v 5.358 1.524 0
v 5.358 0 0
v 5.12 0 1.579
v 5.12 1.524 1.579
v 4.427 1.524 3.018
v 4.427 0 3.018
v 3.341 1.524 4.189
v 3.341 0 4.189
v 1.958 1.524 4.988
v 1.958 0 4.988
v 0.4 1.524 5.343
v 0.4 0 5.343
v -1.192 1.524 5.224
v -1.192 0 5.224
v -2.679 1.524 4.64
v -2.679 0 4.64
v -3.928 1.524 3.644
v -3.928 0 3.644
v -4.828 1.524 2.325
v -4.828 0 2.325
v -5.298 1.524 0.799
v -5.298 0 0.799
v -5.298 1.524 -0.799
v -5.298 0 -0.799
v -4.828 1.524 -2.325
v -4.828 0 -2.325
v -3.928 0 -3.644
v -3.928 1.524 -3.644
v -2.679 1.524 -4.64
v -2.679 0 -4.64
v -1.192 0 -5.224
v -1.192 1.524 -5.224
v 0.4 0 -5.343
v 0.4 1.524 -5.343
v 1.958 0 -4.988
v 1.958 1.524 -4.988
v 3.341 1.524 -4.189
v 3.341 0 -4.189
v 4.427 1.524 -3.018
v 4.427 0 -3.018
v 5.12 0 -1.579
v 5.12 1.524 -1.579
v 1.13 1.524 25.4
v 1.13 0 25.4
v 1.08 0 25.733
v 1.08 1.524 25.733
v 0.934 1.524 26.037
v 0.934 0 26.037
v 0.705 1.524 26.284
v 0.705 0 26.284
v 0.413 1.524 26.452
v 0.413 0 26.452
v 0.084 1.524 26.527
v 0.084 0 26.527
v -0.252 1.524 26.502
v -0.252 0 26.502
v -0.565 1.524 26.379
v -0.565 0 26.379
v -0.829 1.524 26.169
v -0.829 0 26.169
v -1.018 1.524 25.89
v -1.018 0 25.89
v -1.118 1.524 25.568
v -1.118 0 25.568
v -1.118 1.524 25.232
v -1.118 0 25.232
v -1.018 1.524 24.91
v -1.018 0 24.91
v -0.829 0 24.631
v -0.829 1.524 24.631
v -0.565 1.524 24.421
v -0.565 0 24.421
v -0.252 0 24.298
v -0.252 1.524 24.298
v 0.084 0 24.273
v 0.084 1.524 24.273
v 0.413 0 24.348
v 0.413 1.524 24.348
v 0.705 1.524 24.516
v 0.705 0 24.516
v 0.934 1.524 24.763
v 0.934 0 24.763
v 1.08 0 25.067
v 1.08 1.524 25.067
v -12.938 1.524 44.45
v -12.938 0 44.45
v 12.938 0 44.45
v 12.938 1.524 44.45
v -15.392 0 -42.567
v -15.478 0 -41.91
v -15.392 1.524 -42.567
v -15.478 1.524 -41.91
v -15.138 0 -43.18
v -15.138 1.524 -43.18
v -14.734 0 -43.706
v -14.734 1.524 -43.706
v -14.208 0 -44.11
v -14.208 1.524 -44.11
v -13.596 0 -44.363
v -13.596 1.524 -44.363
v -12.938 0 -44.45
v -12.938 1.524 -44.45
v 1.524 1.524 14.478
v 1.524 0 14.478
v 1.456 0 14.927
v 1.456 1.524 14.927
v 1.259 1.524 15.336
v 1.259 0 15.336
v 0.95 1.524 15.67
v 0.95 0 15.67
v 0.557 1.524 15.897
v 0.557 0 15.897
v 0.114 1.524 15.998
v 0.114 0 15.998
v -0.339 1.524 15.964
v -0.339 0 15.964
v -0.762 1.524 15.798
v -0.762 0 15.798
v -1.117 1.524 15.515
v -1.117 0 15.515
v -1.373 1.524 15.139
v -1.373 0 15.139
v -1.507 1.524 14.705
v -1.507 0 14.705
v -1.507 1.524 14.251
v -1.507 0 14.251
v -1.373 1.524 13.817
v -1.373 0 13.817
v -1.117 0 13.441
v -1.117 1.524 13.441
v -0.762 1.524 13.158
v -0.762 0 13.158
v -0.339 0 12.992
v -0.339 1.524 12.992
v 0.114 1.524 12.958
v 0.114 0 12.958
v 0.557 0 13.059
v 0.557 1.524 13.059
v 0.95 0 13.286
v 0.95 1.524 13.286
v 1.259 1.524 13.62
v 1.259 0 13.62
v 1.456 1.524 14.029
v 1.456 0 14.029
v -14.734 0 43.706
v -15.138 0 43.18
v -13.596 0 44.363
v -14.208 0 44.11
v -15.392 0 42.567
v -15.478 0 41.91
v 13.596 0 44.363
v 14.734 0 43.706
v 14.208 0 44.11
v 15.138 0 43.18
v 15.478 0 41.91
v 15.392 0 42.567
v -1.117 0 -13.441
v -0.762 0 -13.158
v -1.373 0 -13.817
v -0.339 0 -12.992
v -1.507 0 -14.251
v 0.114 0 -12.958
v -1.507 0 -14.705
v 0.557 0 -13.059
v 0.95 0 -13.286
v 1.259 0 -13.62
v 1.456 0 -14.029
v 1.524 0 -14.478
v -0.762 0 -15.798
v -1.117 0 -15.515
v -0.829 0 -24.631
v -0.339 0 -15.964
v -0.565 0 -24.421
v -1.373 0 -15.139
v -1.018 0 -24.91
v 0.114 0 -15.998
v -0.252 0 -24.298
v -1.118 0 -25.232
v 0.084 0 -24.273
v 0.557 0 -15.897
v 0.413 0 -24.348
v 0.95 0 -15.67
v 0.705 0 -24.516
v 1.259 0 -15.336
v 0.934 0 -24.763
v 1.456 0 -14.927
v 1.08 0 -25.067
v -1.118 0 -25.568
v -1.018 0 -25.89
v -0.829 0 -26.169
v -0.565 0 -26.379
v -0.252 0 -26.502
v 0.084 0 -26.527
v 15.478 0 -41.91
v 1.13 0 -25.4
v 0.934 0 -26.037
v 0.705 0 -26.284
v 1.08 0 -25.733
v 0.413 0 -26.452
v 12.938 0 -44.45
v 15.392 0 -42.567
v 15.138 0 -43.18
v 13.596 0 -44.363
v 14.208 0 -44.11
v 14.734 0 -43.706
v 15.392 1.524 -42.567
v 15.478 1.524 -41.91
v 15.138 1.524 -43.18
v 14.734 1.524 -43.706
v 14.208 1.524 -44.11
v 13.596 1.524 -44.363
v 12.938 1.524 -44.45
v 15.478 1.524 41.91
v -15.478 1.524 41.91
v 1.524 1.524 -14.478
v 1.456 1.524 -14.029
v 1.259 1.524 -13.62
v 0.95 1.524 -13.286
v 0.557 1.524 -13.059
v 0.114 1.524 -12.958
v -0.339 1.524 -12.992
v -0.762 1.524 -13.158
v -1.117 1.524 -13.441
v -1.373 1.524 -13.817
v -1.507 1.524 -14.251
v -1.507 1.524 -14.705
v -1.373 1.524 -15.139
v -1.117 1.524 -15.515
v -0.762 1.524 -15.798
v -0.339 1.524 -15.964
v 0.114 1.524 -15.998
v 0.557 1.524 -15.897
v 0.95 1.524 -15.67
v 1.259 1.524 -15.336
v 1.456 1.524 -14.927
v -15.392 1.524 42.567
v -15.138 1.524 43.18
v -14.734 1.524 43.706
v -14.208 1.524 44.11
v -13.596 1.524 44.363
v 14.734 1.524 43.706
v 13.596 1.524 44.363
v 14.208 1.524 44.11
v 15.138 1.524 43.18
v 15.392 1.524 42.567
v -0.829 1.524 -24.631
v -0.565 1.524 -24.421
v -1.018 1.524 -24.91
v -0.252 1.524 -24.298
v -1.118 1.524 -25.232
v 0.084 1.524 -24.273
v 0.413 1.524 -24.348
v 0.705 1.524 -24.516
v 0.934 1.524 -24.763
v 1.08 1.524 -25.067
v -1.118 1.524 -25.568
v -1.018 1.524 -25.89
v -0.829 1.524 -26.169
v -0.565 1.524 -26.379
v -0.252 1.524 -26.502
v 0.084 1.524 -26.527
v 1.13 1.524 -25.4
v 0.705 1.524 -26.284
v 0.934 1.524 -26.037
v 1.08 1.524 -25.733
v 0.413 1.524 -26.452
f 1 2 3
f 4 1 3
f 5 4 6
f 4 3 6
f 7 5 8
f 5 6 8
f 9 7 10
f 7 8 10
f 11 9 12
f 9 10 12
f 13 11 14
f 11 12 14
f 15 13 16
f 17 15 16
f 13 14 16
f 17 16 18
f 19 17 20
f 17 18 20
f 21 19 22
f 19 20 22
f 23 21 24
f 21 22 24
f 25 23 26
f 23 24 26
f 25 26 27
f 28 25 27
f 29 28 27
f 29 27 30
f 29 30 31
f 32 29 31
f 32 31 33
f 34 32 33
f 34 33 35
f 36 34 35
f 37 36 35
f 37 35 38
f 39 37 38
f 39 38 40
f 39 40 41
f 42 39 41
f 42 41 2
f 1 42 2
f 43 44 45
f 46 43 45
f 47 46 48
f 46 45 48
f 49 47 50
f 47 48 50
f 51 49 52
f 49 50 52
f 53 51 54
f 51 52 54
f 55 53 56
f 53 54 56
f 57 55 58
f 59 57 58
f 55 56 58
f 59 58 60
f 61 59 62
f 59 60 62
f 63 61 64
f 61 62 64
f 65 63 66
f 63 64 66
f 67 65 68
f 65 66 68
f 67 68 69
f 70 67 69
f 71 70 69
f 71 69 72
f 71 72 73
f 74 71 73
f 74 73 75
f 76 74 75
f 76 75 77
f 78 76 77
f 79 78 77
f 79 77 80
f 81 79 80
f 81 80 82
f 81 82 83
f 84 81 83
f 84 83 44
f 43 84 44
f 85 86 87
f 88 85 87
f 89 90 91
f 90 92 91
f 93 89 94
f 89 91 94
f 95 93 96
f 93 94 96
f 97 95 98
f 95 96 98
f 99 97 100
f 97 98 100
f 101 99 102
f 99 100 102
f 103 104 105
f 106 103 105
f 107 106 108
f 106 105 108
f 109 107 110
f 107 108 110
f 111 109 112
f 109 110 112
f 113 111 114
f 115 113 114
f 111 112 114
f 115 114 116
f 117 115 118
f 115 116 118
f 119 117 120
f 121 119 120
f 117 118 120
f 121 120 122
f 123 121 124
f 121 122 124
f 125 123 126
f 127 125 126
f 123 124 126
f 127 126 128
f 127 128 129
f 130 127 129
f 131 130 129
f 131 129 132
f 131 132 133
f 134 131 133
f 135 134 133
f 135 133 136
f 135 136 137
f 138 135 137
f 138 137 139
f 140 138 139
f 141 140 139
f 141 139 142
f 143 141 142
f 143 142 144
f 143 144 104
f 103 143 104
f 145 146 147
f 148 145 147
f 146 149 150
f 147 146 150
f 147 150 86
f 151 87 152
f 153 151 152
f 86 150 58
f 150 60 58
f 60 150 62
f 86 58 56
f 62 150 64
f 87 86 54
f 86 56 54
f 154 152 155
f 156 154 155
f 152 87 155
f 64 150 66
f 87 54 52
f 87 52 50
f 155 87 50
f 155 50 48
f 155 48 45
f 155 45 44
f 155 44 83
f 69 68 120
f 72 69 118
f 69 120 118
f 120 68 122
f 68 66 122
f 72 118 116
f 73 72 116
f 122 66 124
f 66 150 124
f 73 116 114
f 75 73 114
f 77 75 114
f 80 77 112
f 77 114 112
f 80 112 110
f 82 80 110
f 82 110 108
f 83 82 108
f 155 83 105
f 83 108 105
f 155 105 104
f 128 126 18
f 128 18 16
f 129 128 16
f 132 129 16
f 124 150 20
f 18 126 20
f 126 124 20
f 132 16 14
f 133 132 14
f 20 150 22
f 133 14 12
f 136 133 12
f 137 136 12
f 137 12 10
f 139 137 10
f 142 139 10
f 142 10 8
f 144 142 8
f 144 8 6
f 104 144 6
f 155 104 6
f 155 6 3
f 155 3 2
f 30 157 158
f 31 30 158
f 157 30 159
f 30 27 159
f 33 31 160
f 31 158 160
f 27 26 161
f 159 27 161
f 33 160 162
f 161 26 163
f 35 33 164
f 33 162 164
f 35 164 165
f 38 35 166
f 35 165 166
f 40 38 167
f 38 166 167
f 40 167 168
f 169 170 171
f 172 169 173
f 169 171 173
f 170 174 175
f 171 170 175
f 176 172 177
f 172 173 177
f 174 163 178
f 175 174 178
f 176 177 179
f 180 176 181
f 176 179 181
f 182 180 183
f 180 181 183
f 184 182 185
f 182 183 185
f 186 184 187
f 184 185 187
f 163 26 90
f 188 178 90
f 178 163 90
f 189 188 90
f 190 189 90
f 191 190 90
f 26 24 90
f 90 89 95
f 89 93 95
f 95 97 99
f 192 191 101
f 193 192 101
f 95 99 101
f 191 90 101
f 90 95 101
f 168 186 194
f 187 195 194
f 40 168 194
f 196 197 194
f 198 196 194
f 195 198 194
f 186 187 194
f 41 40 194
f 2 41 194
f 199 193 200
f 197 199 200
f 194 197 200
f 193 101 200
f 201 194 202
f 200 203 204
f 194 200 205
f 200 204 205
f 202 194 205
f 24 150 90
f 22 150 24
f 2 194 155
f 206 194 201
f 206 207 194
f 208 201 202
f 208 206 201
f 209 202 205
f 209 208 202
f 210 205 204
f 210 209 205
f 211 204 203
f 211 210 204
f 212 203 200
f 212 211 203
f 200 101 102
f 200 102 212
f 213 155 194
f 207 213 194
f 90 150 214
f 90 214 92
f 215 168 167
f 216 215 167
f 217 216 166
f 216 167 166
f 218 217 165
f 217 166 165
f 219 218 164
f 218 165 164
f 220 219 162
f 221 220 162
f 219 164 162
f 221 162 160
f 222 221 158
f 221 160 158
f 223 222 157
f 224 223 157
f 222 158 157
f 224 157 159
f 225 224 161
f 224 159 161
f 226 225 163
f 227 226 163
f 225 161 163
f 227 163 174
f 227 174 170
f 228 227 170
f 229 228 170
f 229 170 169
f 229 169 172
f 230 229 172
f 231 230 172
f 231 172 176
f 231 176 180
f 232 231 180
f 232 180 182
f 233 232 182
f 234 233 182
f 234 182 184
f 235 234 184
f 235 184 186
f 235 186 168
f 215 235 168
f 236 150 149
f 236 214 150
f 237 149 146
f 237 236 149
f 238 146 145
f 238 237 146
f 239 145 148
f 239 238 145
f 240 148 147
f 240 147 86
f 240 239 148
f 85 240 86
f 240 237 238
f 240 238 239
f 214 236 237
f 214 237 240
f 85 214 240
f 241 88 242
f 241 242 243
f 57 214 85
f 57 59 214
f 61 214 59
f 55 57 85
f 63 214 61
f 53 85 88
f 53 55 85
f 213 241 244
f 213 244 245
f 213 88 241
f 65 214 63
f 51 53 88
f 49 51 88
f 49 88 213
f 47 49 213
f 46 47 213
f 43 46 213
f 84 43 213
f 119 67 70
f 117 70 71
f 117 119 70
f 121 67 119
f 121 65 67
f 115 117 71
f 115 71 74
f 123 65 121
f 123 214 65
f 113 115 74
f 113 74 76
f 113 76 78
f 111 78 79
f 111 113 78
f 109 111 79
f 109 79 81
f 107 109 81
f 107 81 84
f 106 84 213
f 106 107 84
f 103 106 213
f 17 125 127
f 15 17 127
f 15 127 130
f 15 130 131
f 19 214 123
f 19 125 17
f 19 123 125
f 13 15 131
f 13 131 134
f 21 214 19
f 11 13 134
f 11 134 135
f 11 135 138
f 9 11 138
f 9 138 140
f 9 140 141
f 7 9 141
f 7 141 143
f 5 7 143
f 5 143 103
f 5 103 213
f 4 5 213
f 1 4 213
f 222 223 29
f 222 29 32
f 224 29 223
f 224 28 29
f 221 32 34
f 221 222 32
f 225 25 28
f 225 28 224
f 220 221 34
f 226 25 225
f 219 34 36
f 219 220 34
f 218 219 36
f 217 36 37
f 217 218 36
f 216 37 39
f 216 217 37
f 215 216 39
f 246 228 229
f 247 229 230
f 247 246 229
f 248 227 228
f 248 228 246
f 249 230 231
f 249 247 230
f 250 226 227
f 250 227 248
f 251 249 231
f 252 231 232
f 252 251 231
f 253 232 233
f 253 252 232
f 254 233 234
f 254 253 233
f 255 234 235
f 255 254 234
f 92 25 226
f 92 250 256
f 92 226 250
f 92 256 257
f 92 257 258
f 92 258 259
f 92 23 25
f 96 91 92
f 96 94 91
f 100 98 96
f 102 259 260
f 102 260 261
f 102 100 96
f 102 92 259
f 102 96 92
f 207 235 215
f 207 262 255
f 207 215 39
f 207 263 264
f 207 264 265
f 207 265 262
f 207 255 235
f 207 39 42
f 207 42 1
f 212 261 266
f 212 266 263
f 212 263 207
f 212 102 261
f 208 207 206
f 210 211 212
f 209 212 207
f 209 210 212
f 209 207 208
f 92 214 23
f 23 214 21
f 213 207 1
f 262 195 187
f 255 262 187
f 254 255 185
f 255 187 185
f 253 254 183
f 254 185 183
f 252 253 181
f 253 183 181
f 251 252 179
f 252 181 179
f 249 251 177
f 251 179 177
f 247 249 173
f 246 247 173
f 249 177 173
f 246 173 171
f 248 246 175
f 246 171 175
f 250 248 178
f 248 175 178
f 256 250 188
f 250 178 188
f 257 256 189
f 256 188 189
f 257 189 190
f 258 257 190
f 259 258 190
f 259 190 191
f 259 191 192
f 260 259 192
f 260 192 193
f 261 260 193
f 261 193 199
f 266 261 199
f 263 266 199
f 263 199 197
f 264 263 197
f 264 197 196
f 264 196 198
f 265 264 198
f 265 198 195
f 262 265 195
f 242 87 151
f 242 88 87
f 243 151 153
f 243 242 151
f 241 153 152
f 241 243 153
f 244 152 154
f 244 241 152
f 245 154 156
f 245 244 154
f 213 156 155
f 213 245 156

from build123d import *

# Parameters (mm, degrees)
SKETCH1_W               = 30.95625
SKETCH1_H               = 88.9
BOSS_EXTRUDE1_DEPTH     = 1.524
FILLET1_R               = 2.54
SKETCH6_R               = 1.524
CUT_EXTRUDE1_DEPTH      = 2.524
F_4_40_TAPPED_HOLE1_D   = 2.2606
F_1_2_13_TAPPED_HOLE1_D = 10.71626


with BuildPart() as part:
    # Sketch1 → Boss-Extrude1 (new body)
    with BuildSketch(Plane(origin=(0, 0, 0), x_dir=(1, 0, 0), z_dir=(0, 1, 0))):
        Rectangle(SKETCH1_W, SKETCH1_H)
    extrude(amount=BOSS_EXTRUDE1_DEPTH)

    # Fillet1
    fillet1_edges = [part.edges().sort_by_distance(p)[0] for p in [
        (15.478125, 0.762, -44.45),
        (15.478125, 0.762, 44.45),
        (-15.478125, 0.762, 44.45),
        (-15.478125, 0.762, -44.45),
    ]]
    fillet(fillet1_edges, radius=FILLET1_R)

    # Sketch6 → Cut-Extrude1 (cut, through all)
    with BuildSketch(Plane.XZ):
        with Locations((0, 14.478)):
            Circle(SKETCH6_R)
        with Locations((0, -14.478)):
            Circle(SKETCH6_R)
    extrude(amount=-CUT_EXTRUDE1_DEPTH, mode=Mode.SUBTRACT)

    # #4-40 Tapped Hole1 (through all)
    with Locations(Plane(origin=(0, 1.524, 0), x_dir=(-1, 0, 0), z_dir=(0, 1, 0))):
        with Locations((0, 25.4), (0, -25.4)):
            Hole(F_4_40_TAPPED_HOLE1_D / 2)

    # 1/2-13 Tapped Hole1 (through all)
    with Locations(Plane(origin=(0, 1.524, 0), x_dir=(-1, 0, 0), z_dir=(0, 1, 0))):
        with Locations((0, 0)):
            Hole(F_1_2_13_TAPPED_HOLE1_D / 2)


solid = part.part
